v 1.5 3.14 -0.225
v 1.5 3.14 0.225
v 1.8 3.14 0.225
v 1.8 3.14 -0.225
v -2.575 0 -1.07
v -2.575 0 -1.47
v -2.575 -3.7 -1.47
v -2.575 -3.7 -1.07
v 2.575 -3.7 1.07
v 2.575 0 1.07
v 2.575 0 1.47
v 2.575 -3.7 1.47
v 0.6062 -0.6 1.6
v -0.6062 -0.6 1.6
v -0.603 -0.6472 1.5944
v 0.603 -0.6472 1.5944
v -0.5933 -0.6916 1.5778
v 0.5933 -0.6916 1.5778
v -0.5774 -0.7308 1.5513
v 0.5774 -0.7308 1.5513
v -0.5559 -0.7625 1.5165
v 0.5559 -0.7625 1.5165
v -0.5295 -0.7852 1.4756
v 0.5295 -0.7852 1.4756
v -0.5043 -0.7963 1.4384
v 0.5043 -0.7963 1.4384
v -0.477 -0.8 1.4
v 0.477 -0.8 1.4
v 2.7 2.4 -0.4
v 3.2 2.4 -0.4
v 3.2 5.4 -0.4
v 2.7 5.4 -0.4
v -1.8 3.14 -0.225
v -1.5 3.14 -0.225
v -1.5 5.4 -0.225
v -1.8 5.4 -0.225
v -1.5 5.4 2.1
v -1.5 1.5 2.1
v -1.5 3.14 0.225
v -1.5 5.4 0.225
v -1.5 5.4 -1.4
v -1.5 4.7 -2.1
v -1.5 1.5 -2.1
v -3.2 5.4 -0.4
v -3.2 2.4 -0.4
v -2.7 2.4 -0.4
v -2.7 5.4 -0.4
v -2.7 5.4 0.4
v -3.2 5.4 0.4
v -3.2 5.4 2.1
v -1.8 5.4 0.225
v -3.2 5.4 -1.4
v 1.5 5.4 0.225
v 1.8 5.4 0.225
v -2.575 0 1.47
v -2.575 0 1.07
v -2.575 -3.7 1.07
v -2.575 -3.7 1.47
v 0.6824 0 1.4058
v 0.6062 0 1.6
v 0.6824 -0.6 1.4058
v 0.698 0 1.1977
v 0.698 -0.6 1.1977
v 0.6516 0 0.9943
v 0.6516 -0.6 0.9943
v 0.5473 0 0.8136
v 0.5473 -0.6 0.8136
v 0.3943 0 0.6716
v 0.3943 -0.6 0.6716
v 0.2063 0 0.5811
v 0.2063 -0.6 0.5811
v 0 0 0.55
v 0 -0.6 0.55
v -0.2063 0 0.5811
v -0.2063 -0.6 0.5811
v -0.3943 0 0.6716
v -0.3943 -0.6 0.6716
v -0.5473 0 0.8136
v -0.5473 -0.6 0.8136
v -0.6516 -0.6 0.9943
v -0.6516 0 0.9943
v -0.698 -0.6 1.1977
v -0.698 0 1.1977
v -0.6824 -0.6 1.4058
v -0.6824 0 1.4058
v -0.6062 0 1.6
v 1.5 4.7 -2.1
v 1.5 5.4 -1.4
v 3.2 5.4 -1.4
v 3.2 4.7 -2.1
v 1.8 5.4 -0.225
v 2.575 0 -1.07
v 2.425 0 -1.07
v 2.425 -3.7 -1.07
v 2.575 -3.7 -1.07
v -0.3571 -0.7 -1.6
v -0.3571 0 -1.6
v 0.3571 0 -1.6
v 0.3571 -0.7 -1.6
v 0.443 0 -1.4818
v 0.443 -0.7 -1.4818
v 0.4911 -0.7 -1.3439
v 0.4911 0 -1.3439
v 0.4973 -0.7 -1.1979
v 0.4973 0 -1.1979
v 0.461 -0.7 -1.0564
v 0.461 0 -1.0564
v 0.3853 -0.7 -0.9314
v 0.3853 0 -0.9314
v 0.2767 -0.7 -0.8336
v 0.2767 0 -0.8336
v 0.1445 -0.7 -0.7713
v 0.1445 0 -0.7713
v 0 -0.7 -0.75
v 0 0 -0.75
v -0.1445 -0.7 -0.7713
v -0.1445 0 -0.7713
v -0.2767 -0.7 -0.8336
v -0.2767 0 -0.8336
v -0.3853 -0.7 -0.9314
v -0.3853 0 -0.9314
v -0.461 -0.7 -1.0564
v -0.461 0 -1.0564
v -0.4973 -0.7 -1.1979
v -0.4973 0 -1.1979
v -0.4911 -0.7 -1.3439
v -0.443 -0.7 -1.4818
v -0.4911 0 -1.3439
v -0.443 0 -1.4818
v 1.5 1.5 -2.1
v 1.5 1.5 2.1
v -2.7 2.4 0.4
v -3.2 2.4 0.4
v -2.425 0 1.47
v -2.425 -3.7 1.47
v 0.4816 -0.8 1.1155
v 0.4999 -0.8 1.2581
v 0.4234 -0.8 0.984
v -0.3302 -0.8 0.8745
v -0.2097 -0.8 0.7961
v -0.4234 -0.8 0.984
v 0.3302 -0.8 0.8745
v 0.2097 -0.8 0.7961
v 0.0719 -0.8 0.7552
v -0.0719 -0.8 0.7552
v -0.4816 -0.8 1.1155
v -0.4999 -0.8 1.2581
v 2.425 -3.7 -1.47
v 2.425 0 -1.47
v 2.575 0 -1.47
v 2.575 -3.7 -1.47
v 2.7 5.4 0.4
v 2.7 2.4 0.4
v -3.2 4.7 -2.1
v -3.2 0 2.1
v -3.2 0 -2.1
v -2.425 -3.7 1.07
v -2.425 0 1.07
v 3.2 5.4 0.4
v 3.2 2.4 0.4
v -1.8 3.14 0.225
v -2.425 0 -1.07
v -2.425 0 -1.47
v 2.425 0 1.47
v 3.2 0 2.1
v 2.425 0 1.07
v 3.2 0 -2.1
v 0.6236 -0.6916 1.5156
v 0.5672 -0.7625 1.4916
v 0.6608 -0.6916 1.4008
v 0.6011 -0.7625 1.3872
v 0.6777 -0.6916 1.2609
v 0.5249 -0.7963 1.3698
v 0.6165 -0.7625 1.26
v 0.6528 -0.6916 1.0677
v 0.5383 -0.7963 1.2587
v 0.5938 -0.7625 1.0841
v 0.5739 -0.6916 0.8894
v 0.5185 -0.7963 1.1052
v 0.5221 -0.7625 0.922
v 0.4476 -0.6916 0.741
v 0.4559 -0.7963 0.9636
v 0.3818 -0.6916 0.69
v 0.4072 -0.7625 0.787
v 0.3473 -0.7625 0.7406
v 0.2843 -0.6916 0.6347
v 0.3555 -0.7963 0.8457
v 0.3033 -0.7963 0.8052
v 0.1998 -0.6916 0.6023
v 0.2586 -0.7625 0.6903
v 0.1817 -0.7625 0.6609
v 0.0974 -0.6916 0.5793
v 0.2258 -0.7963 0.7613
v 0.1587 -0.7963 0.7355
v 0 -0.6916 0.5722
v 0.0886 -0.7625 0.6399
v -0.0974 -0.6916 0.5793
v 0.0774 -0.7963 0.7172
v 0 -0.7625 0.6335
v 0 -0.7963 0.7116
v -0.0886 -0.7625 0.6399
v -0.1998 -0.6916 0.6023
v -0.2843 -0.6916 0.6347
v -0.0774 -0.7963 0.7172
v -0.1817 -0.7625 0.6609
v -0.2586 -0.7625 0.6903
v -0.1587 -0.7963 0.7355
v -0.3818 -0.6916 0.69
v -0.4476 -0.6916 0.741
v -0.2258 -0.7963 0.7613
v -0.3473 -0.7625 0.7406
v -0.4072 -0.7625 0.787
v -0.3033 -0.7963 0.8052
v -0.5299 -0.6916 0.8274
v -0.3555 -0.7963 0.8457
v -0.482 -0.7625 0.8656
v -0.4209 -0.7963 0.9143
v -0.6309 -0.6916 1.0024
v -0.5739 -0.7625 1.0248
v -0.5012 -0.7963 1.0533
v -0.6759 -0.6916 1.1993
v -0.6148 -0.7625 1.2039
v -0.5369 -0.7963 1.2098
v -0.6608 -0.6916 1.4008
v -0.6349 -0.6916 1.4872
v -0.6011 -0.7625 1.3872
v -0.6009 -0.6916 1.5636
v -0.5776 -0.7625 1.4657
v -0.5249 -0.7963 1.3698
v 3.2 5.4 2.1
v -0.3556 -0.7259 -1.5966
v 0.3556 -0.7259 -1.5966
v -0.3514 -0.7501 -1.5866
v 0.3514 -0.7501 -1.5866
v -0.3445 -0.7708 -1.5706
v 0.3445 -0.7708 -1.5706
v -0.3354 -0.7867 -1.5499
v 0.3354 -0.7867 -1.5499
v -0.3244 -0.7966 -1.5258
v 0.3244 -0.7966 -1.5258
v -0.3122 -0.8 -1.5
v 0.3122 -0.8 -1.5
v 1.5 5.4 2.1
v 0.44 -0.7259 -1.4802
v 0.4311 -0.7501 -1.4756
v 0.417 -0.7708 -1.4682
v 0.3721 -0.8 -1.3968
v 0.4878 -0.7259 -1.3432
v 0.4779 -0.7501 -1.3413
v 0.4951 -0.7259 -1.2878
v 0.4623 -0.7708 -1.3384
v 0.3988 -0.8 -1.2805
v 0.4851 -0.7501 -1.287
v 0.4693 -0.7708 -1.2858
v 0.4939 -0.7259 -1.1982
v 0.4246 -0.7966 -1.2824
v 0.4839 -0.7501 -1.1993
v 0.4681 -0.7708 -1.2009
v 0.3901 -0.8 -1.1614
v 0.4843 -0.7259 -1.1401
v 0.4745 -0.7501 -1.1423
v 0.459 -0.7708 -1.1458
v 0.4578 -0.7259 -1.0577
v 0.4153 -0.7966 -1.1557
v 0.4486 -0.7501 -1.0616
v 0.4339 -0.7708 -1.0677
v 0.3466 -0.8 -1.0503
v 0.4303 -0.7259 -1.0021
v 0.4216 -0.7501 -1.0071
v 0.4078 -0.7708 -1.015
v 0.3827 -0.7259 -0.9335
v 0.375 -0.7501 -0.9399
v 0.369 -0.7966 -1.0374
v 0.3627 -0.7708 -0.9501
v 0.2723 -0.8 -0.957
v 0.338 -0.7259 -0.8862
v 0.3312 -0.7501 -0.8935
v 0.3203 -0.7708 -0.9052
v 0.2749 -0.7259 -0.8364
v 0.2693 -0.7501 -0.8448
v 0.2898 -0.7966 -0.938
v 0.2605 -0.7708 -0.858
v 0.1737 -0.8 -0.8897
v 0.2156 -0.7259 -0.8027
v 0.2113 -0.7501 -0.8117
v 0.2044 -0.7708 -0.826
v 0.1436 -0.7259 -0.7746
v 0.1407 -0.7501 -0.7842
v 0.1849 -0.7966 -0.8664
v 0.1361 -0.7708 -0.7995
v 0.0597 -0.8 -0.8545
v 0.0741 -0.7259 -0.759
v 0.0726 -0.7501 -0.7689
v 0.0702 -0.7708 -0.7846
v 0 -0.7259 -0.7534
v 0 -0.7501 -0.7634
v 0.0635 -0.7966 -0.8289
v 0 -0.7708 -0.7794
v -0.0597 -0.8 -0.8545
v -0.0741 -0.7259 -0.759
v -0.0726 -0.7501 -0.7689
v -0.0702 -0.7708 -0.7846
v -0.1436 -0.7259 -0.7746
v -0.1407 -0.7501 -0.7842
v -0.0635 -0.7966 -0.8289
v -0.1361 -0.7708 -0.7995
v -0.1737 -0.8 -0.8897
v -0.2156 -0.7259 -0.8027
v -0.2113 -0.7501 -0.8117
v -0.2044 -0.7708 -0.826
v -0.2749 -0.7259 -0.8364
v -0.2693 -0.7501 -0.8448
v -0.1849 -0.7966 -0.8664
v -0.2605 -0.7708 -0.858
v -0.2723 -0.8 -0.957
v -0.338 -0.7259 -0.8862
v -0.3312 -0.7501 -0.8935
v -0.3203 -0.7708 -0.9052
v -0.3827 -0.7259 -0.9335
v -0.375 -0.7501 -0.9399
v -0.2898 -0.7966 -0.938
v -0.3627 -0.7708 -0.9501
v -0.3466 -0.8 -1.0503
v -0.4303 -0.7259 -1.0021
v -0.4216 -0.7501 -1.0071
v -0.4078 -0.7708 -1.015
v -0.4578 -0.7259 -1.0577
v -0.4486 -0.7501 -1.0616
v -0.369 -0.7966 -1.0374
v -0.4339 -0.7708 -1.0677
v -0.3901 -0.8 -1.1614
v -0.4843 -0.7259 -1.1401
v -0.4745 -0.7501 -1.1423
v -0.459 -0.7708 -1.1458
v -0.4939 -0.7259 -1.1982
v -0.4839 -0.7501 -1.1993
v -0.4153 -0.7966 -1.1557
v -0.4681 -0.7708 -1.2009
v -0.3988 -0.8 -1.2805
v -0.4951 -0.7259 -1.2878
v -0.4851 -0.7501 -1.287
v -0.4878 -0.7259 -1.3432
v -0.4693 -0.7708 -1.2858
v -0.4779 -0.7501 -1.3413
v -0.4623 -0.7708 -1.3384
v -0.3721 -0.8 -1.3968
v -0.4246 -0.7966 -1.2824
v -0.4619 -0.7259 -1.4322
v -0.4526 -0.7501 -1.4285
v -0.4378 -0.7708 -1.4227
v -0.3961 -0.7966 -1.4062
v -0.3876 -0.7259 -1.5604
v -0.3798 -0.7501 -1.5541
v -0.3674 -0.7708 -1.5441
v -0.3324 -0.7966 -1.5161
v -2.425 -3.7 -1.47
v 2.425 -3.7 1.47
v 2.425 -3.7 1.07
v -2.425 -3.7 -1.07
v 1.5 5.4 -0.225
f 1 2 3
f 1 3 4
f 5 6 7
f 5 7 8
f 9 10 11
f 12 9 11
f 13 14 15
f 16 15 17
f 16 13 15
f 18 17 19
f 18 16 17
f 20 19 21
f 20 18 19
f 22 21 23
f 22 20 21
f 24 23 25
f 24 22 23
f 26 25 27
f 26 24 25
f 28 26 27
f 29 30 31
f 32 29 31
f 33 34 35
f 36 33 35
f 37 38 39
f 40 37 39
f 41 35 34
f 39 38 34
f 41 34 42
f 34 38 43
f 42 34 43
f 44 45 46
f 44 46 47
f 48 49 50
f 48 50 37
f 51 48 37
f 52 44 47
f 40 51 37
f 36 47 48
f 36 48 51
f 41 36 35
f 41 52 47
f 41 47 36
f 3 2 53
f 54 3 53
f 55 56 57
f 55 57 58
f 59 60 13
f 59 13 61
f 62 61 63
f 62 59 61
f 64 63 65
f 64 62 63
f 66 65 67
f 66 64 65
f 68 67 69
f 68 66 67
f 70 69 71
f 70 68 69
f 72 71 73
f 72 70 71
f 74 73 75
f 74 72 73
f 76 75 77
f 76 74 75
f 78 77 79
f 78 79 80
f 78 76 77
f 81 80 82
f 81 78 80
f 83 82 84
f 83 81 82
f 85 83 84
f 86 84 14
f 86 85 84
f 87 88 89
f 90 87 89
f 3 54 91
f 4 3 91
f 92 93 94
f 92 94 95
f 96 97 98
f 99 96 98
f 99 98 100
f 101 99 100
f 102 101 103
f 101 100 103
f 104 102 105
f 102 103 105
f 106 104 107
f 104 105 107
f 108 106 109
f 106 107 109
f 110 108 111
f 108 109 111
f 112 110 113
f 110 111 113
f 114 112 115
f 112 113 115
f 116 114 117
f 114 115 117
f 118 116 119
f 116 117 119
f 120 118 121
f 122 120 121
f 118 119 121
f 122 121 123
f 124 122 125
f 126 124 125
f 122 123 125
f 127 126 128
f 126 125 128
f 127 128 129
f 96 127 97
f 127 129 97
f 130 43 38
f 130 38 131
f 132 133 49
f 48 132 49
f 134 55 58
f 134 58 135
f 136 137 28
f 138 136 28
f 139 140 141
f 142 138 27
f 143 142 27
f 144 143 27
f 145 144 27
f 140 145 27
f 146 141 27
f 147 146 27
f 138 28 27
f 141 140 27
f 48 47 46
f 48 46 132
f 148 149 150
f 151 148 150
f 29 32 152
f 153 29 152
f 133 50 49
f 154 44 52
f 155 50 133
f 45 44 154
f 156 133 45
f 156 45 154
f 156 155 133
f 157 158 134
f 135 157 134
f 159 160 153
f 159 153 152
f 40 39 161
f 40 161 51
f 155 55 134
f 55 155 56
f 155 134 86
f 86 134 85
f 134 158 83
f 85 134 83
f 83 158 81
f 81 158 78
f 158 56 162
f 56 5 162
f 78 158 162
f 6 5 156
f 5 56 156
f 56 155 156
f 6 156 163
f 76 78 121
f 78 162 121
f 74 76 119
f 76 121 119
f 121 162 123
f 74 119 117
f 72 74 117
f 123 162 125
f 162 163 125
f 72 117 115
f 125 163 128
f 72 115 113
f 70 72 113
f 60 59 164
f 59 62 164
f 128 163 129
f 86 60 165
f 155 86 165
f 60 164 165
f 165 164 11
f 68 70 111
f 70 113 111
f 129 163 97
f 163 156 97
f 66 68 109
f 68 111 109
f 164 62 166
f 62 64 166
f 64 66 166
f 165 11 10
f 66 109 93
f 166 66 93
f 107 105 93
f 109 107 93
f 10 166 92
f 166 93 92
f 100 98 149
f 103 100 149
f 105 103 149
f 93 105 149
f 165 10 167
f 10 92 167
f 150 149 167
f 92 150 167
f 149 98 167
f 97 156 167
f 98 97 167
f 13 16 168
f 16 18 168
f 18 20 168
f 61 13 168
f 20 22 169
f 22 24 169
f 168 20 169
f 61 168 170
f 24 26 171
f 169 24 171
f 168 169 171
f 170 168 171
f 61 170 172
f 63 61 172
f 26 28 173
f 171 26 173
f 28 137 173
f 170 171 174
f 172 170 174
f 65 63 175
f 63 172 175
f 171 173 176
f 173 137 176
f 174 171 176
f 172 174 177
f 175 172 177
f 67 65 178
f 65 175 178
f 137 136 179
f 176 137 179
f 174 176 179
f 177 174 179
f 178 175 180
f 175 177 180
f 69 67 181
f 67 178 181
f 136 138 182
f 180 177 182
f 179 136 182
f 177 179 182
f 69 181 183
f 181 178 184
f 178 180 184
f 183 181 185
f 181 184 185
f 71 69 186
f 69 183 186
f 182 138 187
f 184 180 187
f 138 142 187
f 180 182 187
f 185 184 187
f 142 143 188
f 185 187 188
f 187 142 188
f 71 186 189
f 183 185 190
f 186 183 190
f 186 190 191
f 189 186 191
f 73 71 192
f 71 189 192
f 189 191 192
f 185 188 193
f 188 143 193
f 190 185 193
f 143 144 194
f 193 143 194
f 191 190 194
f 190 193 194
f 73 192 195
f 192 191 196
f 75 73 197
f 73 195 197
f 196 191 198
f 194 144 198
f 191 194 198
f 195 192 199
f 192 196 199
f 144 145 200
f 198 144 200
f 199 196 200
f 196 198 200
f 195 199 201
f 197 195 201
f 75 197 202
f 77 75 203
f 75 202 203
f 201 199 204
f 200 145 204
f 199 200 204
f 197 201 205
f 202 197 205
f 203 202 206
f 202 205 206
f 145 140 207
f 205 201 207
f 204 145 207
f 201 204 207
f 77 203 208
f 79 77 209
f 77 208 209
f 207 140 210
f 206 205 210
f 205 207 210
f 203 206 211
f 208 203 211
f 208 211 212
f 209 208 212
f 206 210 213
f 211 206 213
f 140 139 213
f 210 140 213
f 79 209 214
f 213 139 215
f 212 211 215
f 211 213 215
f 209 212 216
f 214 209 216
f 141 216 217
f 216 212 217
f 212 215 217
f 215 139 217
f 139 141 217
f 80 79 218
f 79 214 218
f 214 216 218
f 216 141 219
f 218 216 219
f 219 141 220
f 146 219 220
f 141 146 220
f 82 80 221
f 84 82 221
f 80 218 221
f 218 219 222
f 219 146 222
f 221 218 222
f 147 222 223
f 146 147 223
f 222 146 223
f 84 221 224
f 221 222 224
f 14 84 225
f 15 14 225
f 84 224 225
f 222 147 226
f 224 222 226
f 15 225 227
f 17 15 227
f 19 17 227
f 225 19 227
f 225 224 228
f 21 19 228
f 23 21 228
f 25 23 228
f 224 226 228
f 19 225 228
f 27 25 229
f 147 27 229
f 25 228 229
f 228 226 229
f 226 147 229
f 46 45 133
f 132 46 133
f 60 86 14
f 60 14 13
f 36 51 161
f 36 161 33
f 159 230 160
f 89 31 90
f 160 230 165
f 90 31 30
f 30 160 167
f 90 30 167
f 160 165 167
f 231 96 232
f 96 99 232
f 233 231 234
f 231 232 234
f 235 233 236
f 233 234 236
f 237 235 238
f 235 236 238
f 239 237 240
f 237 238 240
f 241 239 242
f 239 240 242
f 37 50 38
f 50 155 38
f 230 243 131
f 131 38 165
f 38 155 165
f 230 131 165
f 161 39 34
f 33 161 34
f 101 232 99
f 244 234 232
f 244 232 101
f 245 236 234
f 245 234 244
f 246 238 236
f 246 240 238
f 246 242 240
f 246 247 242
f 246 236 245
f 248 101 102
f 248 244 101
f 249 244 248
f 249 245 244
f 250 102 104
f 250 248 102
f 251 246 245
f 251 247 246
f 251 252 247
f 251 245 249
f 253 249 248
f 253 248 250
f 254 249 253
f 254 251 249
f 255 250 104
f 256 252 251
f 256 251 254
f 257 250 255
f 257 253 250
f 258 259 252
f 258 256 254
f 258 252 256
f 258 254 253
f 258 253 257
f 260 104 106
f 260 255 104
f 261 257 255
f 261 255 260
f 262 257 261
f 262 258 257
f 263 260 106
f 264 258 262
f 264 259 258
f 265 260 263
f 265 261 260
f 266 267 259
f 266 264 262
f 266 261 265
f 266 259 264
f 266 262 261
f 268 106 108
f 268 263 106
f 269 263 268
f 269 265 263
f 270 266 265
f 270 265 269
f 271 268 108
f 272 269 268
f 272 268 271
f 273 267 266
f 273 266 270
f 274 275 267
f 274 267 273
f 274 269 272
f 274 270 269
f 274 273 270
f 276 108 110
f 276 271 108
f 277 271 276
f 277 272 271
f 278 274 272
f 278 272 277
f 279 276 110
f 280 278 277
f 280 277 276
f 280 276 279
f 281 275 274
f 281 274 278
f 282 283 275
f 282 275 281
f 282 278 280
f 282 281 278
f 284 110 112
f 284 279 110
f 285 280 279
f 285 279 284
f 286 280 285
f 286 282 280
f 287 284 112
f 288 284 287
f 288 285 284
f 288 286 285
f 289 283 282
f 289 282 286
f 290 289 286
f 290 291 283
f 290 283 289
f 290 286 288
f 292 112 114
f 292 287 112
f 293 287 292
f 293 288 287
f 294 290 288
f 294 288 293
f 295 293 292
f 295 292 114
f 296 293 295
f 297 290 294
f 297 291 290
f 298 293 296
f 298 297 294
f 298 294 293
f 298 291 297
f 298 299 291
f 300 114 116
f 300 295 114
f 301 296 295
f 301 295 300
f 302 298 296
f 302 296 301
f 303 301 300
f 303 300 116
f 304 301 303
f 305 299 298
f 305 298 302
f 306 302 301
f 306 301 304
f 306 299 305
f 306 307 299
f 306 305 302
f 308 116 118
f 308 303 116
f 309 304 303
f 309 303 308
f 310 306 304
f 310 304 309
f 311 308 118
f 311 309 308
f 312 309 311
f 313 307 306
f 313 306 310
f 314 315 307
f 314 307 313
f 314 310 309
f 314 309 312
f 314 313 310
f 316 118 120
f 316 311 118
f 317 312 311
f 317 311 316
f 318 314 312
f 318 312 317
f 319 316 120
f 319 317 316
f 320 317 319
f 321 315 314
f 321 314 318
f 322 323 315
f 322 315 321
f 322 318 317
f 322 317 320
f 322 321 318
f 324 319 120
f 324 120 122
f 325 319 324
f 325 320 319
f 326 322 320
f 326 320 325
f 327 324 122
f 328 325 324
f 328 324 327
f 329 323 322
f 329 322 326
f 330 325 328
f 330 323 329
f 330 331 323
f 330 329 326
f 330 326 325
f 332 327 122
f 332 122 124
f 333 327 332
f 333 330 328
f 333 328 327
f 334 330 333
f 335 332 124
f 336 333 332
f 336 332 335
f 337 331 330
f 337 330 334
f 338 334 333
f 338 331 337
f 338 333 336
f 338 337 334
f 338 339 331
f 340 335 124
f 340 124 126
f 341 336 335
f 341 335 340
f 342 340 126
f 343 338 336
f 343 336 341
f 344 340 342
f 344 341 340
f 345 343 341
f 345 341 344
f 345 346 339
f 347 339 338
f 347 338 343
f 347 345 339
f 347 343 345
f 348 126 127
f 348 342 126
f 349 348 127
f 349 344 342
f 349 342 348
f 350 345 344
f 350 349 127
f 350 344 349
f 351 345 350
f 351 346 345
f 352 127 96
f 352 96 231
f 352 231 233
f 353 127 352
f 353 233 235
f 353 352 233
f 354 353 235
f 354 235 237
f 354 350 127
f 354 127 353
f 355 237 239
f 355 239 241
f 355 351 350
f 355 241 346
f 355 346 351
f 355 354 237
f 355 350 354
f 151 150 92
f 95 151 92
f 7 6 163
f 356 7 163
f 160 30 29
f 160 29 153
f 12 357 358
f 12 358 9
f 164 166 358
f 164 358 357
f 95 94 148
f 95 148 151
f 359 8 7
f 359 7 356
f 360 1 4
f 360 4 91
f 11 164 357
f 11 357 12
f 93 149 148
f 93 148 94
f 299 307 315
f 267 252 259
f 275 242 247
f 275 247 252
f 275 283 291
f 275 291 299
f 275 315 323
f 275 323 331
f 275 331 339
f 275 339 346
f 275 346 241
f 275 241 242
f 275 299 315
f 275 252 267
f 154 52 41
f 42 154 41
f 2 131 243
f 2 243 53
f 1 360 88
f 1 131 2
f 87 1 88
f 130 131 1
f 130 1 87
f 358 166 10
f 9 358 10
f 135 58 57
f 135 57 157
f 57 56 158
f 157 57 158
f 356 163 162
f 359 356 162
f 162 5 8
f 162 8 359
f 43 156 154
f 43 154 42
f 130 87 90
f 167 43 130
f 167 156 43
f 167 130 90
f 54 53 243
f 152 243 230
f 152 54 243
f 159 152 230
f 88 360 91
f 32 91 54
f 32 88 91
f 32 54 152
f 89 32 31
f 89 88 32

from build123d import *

# Parameters (mm, degrees)
SKETCH2_W           = 6.4
SKETCH2_H           = 4.2
BOSS_EXTRUDE1_DEPTH = 1.5
SKETCH3_W           = 1.7
SKETCH3_H           = 4.2
BOSS_EXTRUDE2_DEPTH = 3.9
SKETCH4_W           = 0.15
SKETCH4_H           = 0.4
BOSS_EXTRUDE3_DEPTH = 3.7
BOSS_EXTRUDE4_DEPTH = 0.8
FILLET1_R           = 0.2
FILLET2_R           = 0.1
SKETCH6_W           = 0.45
SKETCH6_H           = 2.26
CUT_EXTRUDE1_DEPTH  = 0.3
SKETCH7_W           = 0.8
SKETCH7_H           = 3
CUT_EXTRUDE2_DEPTH  = 0.5
CHAMFER3_SIZE       = 0.7


with BuildPart() as part:
    # Sketch2 → Boss-Extrude1 (new body)
    with BuildSketch(Plane(origin=(0, 0, 0), x_dir=(1, 0, 0), z_dir=(0, 1, 0))):
        Rectangle(SKETCH2_W, SKETCH2_H)
    extrude(amount=BOSS_EXTRUDE1_DEPTH)

    # Sketch3 → Boss-Extrude2 (add)
    with BuildSketch(Plane(origin=(0, 1.5, 0), x_dir=(1, 0, 0), z_dir=(0, 1, 0))):
        with Locations((-2.35, 0)):
            Rectangle(SKETCH3_W, SKETCH3_H)
        with Locations((2.35, 0)):
            Rectangle(SKETCH3_W, SKETCH3_H)
    extrude(amount=BOSS_EXTRUDE2_DEPTH)

    # Sketch4 → Boss-Extrude3 (add)
    with BuildSketch(Plane.XZ):
        with Locations((2.5, 1.27)):
            Rectangle(SKETCH4_W, SKETCH4_H)
        with Locations((-2.5, 1.27)):
            Rectangle(SKETCH4_W, SKETCH4_H)
        with Locations((2.5, -1.27)):
            Rectangle(SKETCH4_W, SKETCH4_H)
        with Locations((-2.5, -1.27)):
            Rectangle(SKETCH4_W, SKETCH4_H)
    extrude(amount=BOSS_EXTRUDE3_DEPTH)

    # Sketch5 → Boss-Extrude4 (add)
    with BuildSketch(Plane.XZ):
        with BuildLine():
            Line((-0.606217783, 1.6), (0.606217783, 1.6))
            ThreePointArc((0.606217783, 1.6), (0, 0.55), (-0.606217783, 1.6))
        make_face()
        with BuildLine():
            Line((-0.357071421, -1.6), (0.357071421, -1.6))
            ThreePointArc((0.357071421, -1.6), (0, -0.75), (-0.357071421, -1.6))
        make_face()
    extrude(amount=BOSS_EXTRUDE4_DEPTH)

    # Fillet1
    fillet1_edges = [part.edges().sort_by_distance(p)[0] for p in [
        (0, -0.8, 0.55),
        (0, -0.8, 1.6),
    ]]
    fillet(fillet1_edges, radius=FILLET1_R)

    # Fillet2
    fillet2_edges = [part.edges().sort_by_distance(p)[0] for p in [
        (0, -0.8, -0.75),
        (0, -0.8, -1.6),
    ]]
    fillet(fillet2_edges, radius=FILLET2_R)

    # Sketch6 → Cut-Extrude1 (cut)
    with BuildSketch(Plane(origin=(-1.5, 0, 0), x_dir=(0, 0, -1), z_dir=(1, 0, 0))):
        with Locations((0, 4.27)):
            Rectangle(SKETCH6_W, SKETCH6_H)
    cut_extrude1 = extrude(amount=-CUT_EXTRUDE1_DEPTH, mode=Mode.SUBTRACT)

    # Sketch7 → Cut-Extrude2 (cut)
    with BuildSketch(Plane.ZY.offset(3.2)):
        with Locations((0, 3.9)):
            Rectangle(SKETCH7_W, SKETCH7_H)
    cut_extrude2 = extrude(amount=-CUT_EXTRUDE2_DEPTH, mode=Mode.SUBTRACT)

    # Chamfer3
    chamfer3_edges = [part.edges().sort_by_distance(p)[0] for p in [
        (2.35, 5.4, -2.1),
        (-2.35, 5.4, -2.1),
    ]]
    chamfer(chamfer3_edges, length=CHAMFER3_SIZE)

    # Mirror5: Cut-Extrude1, Cut-Extrude2 across plane
    add(cut_extrude1.mirror(Plane(origin=(0, 0, 0), x_dir=(0, 0, 1), z_dir=(1, 0, 0))), mode=Mode.SUBTRACT)
    add(cut_extrude2.mirror(Plane(origin=(0, 0, 0), x_dir=(0, 0, 1), z_dir=(1, 0, 0))), mode=Mode.SUBTRACT)


solid = part.part
